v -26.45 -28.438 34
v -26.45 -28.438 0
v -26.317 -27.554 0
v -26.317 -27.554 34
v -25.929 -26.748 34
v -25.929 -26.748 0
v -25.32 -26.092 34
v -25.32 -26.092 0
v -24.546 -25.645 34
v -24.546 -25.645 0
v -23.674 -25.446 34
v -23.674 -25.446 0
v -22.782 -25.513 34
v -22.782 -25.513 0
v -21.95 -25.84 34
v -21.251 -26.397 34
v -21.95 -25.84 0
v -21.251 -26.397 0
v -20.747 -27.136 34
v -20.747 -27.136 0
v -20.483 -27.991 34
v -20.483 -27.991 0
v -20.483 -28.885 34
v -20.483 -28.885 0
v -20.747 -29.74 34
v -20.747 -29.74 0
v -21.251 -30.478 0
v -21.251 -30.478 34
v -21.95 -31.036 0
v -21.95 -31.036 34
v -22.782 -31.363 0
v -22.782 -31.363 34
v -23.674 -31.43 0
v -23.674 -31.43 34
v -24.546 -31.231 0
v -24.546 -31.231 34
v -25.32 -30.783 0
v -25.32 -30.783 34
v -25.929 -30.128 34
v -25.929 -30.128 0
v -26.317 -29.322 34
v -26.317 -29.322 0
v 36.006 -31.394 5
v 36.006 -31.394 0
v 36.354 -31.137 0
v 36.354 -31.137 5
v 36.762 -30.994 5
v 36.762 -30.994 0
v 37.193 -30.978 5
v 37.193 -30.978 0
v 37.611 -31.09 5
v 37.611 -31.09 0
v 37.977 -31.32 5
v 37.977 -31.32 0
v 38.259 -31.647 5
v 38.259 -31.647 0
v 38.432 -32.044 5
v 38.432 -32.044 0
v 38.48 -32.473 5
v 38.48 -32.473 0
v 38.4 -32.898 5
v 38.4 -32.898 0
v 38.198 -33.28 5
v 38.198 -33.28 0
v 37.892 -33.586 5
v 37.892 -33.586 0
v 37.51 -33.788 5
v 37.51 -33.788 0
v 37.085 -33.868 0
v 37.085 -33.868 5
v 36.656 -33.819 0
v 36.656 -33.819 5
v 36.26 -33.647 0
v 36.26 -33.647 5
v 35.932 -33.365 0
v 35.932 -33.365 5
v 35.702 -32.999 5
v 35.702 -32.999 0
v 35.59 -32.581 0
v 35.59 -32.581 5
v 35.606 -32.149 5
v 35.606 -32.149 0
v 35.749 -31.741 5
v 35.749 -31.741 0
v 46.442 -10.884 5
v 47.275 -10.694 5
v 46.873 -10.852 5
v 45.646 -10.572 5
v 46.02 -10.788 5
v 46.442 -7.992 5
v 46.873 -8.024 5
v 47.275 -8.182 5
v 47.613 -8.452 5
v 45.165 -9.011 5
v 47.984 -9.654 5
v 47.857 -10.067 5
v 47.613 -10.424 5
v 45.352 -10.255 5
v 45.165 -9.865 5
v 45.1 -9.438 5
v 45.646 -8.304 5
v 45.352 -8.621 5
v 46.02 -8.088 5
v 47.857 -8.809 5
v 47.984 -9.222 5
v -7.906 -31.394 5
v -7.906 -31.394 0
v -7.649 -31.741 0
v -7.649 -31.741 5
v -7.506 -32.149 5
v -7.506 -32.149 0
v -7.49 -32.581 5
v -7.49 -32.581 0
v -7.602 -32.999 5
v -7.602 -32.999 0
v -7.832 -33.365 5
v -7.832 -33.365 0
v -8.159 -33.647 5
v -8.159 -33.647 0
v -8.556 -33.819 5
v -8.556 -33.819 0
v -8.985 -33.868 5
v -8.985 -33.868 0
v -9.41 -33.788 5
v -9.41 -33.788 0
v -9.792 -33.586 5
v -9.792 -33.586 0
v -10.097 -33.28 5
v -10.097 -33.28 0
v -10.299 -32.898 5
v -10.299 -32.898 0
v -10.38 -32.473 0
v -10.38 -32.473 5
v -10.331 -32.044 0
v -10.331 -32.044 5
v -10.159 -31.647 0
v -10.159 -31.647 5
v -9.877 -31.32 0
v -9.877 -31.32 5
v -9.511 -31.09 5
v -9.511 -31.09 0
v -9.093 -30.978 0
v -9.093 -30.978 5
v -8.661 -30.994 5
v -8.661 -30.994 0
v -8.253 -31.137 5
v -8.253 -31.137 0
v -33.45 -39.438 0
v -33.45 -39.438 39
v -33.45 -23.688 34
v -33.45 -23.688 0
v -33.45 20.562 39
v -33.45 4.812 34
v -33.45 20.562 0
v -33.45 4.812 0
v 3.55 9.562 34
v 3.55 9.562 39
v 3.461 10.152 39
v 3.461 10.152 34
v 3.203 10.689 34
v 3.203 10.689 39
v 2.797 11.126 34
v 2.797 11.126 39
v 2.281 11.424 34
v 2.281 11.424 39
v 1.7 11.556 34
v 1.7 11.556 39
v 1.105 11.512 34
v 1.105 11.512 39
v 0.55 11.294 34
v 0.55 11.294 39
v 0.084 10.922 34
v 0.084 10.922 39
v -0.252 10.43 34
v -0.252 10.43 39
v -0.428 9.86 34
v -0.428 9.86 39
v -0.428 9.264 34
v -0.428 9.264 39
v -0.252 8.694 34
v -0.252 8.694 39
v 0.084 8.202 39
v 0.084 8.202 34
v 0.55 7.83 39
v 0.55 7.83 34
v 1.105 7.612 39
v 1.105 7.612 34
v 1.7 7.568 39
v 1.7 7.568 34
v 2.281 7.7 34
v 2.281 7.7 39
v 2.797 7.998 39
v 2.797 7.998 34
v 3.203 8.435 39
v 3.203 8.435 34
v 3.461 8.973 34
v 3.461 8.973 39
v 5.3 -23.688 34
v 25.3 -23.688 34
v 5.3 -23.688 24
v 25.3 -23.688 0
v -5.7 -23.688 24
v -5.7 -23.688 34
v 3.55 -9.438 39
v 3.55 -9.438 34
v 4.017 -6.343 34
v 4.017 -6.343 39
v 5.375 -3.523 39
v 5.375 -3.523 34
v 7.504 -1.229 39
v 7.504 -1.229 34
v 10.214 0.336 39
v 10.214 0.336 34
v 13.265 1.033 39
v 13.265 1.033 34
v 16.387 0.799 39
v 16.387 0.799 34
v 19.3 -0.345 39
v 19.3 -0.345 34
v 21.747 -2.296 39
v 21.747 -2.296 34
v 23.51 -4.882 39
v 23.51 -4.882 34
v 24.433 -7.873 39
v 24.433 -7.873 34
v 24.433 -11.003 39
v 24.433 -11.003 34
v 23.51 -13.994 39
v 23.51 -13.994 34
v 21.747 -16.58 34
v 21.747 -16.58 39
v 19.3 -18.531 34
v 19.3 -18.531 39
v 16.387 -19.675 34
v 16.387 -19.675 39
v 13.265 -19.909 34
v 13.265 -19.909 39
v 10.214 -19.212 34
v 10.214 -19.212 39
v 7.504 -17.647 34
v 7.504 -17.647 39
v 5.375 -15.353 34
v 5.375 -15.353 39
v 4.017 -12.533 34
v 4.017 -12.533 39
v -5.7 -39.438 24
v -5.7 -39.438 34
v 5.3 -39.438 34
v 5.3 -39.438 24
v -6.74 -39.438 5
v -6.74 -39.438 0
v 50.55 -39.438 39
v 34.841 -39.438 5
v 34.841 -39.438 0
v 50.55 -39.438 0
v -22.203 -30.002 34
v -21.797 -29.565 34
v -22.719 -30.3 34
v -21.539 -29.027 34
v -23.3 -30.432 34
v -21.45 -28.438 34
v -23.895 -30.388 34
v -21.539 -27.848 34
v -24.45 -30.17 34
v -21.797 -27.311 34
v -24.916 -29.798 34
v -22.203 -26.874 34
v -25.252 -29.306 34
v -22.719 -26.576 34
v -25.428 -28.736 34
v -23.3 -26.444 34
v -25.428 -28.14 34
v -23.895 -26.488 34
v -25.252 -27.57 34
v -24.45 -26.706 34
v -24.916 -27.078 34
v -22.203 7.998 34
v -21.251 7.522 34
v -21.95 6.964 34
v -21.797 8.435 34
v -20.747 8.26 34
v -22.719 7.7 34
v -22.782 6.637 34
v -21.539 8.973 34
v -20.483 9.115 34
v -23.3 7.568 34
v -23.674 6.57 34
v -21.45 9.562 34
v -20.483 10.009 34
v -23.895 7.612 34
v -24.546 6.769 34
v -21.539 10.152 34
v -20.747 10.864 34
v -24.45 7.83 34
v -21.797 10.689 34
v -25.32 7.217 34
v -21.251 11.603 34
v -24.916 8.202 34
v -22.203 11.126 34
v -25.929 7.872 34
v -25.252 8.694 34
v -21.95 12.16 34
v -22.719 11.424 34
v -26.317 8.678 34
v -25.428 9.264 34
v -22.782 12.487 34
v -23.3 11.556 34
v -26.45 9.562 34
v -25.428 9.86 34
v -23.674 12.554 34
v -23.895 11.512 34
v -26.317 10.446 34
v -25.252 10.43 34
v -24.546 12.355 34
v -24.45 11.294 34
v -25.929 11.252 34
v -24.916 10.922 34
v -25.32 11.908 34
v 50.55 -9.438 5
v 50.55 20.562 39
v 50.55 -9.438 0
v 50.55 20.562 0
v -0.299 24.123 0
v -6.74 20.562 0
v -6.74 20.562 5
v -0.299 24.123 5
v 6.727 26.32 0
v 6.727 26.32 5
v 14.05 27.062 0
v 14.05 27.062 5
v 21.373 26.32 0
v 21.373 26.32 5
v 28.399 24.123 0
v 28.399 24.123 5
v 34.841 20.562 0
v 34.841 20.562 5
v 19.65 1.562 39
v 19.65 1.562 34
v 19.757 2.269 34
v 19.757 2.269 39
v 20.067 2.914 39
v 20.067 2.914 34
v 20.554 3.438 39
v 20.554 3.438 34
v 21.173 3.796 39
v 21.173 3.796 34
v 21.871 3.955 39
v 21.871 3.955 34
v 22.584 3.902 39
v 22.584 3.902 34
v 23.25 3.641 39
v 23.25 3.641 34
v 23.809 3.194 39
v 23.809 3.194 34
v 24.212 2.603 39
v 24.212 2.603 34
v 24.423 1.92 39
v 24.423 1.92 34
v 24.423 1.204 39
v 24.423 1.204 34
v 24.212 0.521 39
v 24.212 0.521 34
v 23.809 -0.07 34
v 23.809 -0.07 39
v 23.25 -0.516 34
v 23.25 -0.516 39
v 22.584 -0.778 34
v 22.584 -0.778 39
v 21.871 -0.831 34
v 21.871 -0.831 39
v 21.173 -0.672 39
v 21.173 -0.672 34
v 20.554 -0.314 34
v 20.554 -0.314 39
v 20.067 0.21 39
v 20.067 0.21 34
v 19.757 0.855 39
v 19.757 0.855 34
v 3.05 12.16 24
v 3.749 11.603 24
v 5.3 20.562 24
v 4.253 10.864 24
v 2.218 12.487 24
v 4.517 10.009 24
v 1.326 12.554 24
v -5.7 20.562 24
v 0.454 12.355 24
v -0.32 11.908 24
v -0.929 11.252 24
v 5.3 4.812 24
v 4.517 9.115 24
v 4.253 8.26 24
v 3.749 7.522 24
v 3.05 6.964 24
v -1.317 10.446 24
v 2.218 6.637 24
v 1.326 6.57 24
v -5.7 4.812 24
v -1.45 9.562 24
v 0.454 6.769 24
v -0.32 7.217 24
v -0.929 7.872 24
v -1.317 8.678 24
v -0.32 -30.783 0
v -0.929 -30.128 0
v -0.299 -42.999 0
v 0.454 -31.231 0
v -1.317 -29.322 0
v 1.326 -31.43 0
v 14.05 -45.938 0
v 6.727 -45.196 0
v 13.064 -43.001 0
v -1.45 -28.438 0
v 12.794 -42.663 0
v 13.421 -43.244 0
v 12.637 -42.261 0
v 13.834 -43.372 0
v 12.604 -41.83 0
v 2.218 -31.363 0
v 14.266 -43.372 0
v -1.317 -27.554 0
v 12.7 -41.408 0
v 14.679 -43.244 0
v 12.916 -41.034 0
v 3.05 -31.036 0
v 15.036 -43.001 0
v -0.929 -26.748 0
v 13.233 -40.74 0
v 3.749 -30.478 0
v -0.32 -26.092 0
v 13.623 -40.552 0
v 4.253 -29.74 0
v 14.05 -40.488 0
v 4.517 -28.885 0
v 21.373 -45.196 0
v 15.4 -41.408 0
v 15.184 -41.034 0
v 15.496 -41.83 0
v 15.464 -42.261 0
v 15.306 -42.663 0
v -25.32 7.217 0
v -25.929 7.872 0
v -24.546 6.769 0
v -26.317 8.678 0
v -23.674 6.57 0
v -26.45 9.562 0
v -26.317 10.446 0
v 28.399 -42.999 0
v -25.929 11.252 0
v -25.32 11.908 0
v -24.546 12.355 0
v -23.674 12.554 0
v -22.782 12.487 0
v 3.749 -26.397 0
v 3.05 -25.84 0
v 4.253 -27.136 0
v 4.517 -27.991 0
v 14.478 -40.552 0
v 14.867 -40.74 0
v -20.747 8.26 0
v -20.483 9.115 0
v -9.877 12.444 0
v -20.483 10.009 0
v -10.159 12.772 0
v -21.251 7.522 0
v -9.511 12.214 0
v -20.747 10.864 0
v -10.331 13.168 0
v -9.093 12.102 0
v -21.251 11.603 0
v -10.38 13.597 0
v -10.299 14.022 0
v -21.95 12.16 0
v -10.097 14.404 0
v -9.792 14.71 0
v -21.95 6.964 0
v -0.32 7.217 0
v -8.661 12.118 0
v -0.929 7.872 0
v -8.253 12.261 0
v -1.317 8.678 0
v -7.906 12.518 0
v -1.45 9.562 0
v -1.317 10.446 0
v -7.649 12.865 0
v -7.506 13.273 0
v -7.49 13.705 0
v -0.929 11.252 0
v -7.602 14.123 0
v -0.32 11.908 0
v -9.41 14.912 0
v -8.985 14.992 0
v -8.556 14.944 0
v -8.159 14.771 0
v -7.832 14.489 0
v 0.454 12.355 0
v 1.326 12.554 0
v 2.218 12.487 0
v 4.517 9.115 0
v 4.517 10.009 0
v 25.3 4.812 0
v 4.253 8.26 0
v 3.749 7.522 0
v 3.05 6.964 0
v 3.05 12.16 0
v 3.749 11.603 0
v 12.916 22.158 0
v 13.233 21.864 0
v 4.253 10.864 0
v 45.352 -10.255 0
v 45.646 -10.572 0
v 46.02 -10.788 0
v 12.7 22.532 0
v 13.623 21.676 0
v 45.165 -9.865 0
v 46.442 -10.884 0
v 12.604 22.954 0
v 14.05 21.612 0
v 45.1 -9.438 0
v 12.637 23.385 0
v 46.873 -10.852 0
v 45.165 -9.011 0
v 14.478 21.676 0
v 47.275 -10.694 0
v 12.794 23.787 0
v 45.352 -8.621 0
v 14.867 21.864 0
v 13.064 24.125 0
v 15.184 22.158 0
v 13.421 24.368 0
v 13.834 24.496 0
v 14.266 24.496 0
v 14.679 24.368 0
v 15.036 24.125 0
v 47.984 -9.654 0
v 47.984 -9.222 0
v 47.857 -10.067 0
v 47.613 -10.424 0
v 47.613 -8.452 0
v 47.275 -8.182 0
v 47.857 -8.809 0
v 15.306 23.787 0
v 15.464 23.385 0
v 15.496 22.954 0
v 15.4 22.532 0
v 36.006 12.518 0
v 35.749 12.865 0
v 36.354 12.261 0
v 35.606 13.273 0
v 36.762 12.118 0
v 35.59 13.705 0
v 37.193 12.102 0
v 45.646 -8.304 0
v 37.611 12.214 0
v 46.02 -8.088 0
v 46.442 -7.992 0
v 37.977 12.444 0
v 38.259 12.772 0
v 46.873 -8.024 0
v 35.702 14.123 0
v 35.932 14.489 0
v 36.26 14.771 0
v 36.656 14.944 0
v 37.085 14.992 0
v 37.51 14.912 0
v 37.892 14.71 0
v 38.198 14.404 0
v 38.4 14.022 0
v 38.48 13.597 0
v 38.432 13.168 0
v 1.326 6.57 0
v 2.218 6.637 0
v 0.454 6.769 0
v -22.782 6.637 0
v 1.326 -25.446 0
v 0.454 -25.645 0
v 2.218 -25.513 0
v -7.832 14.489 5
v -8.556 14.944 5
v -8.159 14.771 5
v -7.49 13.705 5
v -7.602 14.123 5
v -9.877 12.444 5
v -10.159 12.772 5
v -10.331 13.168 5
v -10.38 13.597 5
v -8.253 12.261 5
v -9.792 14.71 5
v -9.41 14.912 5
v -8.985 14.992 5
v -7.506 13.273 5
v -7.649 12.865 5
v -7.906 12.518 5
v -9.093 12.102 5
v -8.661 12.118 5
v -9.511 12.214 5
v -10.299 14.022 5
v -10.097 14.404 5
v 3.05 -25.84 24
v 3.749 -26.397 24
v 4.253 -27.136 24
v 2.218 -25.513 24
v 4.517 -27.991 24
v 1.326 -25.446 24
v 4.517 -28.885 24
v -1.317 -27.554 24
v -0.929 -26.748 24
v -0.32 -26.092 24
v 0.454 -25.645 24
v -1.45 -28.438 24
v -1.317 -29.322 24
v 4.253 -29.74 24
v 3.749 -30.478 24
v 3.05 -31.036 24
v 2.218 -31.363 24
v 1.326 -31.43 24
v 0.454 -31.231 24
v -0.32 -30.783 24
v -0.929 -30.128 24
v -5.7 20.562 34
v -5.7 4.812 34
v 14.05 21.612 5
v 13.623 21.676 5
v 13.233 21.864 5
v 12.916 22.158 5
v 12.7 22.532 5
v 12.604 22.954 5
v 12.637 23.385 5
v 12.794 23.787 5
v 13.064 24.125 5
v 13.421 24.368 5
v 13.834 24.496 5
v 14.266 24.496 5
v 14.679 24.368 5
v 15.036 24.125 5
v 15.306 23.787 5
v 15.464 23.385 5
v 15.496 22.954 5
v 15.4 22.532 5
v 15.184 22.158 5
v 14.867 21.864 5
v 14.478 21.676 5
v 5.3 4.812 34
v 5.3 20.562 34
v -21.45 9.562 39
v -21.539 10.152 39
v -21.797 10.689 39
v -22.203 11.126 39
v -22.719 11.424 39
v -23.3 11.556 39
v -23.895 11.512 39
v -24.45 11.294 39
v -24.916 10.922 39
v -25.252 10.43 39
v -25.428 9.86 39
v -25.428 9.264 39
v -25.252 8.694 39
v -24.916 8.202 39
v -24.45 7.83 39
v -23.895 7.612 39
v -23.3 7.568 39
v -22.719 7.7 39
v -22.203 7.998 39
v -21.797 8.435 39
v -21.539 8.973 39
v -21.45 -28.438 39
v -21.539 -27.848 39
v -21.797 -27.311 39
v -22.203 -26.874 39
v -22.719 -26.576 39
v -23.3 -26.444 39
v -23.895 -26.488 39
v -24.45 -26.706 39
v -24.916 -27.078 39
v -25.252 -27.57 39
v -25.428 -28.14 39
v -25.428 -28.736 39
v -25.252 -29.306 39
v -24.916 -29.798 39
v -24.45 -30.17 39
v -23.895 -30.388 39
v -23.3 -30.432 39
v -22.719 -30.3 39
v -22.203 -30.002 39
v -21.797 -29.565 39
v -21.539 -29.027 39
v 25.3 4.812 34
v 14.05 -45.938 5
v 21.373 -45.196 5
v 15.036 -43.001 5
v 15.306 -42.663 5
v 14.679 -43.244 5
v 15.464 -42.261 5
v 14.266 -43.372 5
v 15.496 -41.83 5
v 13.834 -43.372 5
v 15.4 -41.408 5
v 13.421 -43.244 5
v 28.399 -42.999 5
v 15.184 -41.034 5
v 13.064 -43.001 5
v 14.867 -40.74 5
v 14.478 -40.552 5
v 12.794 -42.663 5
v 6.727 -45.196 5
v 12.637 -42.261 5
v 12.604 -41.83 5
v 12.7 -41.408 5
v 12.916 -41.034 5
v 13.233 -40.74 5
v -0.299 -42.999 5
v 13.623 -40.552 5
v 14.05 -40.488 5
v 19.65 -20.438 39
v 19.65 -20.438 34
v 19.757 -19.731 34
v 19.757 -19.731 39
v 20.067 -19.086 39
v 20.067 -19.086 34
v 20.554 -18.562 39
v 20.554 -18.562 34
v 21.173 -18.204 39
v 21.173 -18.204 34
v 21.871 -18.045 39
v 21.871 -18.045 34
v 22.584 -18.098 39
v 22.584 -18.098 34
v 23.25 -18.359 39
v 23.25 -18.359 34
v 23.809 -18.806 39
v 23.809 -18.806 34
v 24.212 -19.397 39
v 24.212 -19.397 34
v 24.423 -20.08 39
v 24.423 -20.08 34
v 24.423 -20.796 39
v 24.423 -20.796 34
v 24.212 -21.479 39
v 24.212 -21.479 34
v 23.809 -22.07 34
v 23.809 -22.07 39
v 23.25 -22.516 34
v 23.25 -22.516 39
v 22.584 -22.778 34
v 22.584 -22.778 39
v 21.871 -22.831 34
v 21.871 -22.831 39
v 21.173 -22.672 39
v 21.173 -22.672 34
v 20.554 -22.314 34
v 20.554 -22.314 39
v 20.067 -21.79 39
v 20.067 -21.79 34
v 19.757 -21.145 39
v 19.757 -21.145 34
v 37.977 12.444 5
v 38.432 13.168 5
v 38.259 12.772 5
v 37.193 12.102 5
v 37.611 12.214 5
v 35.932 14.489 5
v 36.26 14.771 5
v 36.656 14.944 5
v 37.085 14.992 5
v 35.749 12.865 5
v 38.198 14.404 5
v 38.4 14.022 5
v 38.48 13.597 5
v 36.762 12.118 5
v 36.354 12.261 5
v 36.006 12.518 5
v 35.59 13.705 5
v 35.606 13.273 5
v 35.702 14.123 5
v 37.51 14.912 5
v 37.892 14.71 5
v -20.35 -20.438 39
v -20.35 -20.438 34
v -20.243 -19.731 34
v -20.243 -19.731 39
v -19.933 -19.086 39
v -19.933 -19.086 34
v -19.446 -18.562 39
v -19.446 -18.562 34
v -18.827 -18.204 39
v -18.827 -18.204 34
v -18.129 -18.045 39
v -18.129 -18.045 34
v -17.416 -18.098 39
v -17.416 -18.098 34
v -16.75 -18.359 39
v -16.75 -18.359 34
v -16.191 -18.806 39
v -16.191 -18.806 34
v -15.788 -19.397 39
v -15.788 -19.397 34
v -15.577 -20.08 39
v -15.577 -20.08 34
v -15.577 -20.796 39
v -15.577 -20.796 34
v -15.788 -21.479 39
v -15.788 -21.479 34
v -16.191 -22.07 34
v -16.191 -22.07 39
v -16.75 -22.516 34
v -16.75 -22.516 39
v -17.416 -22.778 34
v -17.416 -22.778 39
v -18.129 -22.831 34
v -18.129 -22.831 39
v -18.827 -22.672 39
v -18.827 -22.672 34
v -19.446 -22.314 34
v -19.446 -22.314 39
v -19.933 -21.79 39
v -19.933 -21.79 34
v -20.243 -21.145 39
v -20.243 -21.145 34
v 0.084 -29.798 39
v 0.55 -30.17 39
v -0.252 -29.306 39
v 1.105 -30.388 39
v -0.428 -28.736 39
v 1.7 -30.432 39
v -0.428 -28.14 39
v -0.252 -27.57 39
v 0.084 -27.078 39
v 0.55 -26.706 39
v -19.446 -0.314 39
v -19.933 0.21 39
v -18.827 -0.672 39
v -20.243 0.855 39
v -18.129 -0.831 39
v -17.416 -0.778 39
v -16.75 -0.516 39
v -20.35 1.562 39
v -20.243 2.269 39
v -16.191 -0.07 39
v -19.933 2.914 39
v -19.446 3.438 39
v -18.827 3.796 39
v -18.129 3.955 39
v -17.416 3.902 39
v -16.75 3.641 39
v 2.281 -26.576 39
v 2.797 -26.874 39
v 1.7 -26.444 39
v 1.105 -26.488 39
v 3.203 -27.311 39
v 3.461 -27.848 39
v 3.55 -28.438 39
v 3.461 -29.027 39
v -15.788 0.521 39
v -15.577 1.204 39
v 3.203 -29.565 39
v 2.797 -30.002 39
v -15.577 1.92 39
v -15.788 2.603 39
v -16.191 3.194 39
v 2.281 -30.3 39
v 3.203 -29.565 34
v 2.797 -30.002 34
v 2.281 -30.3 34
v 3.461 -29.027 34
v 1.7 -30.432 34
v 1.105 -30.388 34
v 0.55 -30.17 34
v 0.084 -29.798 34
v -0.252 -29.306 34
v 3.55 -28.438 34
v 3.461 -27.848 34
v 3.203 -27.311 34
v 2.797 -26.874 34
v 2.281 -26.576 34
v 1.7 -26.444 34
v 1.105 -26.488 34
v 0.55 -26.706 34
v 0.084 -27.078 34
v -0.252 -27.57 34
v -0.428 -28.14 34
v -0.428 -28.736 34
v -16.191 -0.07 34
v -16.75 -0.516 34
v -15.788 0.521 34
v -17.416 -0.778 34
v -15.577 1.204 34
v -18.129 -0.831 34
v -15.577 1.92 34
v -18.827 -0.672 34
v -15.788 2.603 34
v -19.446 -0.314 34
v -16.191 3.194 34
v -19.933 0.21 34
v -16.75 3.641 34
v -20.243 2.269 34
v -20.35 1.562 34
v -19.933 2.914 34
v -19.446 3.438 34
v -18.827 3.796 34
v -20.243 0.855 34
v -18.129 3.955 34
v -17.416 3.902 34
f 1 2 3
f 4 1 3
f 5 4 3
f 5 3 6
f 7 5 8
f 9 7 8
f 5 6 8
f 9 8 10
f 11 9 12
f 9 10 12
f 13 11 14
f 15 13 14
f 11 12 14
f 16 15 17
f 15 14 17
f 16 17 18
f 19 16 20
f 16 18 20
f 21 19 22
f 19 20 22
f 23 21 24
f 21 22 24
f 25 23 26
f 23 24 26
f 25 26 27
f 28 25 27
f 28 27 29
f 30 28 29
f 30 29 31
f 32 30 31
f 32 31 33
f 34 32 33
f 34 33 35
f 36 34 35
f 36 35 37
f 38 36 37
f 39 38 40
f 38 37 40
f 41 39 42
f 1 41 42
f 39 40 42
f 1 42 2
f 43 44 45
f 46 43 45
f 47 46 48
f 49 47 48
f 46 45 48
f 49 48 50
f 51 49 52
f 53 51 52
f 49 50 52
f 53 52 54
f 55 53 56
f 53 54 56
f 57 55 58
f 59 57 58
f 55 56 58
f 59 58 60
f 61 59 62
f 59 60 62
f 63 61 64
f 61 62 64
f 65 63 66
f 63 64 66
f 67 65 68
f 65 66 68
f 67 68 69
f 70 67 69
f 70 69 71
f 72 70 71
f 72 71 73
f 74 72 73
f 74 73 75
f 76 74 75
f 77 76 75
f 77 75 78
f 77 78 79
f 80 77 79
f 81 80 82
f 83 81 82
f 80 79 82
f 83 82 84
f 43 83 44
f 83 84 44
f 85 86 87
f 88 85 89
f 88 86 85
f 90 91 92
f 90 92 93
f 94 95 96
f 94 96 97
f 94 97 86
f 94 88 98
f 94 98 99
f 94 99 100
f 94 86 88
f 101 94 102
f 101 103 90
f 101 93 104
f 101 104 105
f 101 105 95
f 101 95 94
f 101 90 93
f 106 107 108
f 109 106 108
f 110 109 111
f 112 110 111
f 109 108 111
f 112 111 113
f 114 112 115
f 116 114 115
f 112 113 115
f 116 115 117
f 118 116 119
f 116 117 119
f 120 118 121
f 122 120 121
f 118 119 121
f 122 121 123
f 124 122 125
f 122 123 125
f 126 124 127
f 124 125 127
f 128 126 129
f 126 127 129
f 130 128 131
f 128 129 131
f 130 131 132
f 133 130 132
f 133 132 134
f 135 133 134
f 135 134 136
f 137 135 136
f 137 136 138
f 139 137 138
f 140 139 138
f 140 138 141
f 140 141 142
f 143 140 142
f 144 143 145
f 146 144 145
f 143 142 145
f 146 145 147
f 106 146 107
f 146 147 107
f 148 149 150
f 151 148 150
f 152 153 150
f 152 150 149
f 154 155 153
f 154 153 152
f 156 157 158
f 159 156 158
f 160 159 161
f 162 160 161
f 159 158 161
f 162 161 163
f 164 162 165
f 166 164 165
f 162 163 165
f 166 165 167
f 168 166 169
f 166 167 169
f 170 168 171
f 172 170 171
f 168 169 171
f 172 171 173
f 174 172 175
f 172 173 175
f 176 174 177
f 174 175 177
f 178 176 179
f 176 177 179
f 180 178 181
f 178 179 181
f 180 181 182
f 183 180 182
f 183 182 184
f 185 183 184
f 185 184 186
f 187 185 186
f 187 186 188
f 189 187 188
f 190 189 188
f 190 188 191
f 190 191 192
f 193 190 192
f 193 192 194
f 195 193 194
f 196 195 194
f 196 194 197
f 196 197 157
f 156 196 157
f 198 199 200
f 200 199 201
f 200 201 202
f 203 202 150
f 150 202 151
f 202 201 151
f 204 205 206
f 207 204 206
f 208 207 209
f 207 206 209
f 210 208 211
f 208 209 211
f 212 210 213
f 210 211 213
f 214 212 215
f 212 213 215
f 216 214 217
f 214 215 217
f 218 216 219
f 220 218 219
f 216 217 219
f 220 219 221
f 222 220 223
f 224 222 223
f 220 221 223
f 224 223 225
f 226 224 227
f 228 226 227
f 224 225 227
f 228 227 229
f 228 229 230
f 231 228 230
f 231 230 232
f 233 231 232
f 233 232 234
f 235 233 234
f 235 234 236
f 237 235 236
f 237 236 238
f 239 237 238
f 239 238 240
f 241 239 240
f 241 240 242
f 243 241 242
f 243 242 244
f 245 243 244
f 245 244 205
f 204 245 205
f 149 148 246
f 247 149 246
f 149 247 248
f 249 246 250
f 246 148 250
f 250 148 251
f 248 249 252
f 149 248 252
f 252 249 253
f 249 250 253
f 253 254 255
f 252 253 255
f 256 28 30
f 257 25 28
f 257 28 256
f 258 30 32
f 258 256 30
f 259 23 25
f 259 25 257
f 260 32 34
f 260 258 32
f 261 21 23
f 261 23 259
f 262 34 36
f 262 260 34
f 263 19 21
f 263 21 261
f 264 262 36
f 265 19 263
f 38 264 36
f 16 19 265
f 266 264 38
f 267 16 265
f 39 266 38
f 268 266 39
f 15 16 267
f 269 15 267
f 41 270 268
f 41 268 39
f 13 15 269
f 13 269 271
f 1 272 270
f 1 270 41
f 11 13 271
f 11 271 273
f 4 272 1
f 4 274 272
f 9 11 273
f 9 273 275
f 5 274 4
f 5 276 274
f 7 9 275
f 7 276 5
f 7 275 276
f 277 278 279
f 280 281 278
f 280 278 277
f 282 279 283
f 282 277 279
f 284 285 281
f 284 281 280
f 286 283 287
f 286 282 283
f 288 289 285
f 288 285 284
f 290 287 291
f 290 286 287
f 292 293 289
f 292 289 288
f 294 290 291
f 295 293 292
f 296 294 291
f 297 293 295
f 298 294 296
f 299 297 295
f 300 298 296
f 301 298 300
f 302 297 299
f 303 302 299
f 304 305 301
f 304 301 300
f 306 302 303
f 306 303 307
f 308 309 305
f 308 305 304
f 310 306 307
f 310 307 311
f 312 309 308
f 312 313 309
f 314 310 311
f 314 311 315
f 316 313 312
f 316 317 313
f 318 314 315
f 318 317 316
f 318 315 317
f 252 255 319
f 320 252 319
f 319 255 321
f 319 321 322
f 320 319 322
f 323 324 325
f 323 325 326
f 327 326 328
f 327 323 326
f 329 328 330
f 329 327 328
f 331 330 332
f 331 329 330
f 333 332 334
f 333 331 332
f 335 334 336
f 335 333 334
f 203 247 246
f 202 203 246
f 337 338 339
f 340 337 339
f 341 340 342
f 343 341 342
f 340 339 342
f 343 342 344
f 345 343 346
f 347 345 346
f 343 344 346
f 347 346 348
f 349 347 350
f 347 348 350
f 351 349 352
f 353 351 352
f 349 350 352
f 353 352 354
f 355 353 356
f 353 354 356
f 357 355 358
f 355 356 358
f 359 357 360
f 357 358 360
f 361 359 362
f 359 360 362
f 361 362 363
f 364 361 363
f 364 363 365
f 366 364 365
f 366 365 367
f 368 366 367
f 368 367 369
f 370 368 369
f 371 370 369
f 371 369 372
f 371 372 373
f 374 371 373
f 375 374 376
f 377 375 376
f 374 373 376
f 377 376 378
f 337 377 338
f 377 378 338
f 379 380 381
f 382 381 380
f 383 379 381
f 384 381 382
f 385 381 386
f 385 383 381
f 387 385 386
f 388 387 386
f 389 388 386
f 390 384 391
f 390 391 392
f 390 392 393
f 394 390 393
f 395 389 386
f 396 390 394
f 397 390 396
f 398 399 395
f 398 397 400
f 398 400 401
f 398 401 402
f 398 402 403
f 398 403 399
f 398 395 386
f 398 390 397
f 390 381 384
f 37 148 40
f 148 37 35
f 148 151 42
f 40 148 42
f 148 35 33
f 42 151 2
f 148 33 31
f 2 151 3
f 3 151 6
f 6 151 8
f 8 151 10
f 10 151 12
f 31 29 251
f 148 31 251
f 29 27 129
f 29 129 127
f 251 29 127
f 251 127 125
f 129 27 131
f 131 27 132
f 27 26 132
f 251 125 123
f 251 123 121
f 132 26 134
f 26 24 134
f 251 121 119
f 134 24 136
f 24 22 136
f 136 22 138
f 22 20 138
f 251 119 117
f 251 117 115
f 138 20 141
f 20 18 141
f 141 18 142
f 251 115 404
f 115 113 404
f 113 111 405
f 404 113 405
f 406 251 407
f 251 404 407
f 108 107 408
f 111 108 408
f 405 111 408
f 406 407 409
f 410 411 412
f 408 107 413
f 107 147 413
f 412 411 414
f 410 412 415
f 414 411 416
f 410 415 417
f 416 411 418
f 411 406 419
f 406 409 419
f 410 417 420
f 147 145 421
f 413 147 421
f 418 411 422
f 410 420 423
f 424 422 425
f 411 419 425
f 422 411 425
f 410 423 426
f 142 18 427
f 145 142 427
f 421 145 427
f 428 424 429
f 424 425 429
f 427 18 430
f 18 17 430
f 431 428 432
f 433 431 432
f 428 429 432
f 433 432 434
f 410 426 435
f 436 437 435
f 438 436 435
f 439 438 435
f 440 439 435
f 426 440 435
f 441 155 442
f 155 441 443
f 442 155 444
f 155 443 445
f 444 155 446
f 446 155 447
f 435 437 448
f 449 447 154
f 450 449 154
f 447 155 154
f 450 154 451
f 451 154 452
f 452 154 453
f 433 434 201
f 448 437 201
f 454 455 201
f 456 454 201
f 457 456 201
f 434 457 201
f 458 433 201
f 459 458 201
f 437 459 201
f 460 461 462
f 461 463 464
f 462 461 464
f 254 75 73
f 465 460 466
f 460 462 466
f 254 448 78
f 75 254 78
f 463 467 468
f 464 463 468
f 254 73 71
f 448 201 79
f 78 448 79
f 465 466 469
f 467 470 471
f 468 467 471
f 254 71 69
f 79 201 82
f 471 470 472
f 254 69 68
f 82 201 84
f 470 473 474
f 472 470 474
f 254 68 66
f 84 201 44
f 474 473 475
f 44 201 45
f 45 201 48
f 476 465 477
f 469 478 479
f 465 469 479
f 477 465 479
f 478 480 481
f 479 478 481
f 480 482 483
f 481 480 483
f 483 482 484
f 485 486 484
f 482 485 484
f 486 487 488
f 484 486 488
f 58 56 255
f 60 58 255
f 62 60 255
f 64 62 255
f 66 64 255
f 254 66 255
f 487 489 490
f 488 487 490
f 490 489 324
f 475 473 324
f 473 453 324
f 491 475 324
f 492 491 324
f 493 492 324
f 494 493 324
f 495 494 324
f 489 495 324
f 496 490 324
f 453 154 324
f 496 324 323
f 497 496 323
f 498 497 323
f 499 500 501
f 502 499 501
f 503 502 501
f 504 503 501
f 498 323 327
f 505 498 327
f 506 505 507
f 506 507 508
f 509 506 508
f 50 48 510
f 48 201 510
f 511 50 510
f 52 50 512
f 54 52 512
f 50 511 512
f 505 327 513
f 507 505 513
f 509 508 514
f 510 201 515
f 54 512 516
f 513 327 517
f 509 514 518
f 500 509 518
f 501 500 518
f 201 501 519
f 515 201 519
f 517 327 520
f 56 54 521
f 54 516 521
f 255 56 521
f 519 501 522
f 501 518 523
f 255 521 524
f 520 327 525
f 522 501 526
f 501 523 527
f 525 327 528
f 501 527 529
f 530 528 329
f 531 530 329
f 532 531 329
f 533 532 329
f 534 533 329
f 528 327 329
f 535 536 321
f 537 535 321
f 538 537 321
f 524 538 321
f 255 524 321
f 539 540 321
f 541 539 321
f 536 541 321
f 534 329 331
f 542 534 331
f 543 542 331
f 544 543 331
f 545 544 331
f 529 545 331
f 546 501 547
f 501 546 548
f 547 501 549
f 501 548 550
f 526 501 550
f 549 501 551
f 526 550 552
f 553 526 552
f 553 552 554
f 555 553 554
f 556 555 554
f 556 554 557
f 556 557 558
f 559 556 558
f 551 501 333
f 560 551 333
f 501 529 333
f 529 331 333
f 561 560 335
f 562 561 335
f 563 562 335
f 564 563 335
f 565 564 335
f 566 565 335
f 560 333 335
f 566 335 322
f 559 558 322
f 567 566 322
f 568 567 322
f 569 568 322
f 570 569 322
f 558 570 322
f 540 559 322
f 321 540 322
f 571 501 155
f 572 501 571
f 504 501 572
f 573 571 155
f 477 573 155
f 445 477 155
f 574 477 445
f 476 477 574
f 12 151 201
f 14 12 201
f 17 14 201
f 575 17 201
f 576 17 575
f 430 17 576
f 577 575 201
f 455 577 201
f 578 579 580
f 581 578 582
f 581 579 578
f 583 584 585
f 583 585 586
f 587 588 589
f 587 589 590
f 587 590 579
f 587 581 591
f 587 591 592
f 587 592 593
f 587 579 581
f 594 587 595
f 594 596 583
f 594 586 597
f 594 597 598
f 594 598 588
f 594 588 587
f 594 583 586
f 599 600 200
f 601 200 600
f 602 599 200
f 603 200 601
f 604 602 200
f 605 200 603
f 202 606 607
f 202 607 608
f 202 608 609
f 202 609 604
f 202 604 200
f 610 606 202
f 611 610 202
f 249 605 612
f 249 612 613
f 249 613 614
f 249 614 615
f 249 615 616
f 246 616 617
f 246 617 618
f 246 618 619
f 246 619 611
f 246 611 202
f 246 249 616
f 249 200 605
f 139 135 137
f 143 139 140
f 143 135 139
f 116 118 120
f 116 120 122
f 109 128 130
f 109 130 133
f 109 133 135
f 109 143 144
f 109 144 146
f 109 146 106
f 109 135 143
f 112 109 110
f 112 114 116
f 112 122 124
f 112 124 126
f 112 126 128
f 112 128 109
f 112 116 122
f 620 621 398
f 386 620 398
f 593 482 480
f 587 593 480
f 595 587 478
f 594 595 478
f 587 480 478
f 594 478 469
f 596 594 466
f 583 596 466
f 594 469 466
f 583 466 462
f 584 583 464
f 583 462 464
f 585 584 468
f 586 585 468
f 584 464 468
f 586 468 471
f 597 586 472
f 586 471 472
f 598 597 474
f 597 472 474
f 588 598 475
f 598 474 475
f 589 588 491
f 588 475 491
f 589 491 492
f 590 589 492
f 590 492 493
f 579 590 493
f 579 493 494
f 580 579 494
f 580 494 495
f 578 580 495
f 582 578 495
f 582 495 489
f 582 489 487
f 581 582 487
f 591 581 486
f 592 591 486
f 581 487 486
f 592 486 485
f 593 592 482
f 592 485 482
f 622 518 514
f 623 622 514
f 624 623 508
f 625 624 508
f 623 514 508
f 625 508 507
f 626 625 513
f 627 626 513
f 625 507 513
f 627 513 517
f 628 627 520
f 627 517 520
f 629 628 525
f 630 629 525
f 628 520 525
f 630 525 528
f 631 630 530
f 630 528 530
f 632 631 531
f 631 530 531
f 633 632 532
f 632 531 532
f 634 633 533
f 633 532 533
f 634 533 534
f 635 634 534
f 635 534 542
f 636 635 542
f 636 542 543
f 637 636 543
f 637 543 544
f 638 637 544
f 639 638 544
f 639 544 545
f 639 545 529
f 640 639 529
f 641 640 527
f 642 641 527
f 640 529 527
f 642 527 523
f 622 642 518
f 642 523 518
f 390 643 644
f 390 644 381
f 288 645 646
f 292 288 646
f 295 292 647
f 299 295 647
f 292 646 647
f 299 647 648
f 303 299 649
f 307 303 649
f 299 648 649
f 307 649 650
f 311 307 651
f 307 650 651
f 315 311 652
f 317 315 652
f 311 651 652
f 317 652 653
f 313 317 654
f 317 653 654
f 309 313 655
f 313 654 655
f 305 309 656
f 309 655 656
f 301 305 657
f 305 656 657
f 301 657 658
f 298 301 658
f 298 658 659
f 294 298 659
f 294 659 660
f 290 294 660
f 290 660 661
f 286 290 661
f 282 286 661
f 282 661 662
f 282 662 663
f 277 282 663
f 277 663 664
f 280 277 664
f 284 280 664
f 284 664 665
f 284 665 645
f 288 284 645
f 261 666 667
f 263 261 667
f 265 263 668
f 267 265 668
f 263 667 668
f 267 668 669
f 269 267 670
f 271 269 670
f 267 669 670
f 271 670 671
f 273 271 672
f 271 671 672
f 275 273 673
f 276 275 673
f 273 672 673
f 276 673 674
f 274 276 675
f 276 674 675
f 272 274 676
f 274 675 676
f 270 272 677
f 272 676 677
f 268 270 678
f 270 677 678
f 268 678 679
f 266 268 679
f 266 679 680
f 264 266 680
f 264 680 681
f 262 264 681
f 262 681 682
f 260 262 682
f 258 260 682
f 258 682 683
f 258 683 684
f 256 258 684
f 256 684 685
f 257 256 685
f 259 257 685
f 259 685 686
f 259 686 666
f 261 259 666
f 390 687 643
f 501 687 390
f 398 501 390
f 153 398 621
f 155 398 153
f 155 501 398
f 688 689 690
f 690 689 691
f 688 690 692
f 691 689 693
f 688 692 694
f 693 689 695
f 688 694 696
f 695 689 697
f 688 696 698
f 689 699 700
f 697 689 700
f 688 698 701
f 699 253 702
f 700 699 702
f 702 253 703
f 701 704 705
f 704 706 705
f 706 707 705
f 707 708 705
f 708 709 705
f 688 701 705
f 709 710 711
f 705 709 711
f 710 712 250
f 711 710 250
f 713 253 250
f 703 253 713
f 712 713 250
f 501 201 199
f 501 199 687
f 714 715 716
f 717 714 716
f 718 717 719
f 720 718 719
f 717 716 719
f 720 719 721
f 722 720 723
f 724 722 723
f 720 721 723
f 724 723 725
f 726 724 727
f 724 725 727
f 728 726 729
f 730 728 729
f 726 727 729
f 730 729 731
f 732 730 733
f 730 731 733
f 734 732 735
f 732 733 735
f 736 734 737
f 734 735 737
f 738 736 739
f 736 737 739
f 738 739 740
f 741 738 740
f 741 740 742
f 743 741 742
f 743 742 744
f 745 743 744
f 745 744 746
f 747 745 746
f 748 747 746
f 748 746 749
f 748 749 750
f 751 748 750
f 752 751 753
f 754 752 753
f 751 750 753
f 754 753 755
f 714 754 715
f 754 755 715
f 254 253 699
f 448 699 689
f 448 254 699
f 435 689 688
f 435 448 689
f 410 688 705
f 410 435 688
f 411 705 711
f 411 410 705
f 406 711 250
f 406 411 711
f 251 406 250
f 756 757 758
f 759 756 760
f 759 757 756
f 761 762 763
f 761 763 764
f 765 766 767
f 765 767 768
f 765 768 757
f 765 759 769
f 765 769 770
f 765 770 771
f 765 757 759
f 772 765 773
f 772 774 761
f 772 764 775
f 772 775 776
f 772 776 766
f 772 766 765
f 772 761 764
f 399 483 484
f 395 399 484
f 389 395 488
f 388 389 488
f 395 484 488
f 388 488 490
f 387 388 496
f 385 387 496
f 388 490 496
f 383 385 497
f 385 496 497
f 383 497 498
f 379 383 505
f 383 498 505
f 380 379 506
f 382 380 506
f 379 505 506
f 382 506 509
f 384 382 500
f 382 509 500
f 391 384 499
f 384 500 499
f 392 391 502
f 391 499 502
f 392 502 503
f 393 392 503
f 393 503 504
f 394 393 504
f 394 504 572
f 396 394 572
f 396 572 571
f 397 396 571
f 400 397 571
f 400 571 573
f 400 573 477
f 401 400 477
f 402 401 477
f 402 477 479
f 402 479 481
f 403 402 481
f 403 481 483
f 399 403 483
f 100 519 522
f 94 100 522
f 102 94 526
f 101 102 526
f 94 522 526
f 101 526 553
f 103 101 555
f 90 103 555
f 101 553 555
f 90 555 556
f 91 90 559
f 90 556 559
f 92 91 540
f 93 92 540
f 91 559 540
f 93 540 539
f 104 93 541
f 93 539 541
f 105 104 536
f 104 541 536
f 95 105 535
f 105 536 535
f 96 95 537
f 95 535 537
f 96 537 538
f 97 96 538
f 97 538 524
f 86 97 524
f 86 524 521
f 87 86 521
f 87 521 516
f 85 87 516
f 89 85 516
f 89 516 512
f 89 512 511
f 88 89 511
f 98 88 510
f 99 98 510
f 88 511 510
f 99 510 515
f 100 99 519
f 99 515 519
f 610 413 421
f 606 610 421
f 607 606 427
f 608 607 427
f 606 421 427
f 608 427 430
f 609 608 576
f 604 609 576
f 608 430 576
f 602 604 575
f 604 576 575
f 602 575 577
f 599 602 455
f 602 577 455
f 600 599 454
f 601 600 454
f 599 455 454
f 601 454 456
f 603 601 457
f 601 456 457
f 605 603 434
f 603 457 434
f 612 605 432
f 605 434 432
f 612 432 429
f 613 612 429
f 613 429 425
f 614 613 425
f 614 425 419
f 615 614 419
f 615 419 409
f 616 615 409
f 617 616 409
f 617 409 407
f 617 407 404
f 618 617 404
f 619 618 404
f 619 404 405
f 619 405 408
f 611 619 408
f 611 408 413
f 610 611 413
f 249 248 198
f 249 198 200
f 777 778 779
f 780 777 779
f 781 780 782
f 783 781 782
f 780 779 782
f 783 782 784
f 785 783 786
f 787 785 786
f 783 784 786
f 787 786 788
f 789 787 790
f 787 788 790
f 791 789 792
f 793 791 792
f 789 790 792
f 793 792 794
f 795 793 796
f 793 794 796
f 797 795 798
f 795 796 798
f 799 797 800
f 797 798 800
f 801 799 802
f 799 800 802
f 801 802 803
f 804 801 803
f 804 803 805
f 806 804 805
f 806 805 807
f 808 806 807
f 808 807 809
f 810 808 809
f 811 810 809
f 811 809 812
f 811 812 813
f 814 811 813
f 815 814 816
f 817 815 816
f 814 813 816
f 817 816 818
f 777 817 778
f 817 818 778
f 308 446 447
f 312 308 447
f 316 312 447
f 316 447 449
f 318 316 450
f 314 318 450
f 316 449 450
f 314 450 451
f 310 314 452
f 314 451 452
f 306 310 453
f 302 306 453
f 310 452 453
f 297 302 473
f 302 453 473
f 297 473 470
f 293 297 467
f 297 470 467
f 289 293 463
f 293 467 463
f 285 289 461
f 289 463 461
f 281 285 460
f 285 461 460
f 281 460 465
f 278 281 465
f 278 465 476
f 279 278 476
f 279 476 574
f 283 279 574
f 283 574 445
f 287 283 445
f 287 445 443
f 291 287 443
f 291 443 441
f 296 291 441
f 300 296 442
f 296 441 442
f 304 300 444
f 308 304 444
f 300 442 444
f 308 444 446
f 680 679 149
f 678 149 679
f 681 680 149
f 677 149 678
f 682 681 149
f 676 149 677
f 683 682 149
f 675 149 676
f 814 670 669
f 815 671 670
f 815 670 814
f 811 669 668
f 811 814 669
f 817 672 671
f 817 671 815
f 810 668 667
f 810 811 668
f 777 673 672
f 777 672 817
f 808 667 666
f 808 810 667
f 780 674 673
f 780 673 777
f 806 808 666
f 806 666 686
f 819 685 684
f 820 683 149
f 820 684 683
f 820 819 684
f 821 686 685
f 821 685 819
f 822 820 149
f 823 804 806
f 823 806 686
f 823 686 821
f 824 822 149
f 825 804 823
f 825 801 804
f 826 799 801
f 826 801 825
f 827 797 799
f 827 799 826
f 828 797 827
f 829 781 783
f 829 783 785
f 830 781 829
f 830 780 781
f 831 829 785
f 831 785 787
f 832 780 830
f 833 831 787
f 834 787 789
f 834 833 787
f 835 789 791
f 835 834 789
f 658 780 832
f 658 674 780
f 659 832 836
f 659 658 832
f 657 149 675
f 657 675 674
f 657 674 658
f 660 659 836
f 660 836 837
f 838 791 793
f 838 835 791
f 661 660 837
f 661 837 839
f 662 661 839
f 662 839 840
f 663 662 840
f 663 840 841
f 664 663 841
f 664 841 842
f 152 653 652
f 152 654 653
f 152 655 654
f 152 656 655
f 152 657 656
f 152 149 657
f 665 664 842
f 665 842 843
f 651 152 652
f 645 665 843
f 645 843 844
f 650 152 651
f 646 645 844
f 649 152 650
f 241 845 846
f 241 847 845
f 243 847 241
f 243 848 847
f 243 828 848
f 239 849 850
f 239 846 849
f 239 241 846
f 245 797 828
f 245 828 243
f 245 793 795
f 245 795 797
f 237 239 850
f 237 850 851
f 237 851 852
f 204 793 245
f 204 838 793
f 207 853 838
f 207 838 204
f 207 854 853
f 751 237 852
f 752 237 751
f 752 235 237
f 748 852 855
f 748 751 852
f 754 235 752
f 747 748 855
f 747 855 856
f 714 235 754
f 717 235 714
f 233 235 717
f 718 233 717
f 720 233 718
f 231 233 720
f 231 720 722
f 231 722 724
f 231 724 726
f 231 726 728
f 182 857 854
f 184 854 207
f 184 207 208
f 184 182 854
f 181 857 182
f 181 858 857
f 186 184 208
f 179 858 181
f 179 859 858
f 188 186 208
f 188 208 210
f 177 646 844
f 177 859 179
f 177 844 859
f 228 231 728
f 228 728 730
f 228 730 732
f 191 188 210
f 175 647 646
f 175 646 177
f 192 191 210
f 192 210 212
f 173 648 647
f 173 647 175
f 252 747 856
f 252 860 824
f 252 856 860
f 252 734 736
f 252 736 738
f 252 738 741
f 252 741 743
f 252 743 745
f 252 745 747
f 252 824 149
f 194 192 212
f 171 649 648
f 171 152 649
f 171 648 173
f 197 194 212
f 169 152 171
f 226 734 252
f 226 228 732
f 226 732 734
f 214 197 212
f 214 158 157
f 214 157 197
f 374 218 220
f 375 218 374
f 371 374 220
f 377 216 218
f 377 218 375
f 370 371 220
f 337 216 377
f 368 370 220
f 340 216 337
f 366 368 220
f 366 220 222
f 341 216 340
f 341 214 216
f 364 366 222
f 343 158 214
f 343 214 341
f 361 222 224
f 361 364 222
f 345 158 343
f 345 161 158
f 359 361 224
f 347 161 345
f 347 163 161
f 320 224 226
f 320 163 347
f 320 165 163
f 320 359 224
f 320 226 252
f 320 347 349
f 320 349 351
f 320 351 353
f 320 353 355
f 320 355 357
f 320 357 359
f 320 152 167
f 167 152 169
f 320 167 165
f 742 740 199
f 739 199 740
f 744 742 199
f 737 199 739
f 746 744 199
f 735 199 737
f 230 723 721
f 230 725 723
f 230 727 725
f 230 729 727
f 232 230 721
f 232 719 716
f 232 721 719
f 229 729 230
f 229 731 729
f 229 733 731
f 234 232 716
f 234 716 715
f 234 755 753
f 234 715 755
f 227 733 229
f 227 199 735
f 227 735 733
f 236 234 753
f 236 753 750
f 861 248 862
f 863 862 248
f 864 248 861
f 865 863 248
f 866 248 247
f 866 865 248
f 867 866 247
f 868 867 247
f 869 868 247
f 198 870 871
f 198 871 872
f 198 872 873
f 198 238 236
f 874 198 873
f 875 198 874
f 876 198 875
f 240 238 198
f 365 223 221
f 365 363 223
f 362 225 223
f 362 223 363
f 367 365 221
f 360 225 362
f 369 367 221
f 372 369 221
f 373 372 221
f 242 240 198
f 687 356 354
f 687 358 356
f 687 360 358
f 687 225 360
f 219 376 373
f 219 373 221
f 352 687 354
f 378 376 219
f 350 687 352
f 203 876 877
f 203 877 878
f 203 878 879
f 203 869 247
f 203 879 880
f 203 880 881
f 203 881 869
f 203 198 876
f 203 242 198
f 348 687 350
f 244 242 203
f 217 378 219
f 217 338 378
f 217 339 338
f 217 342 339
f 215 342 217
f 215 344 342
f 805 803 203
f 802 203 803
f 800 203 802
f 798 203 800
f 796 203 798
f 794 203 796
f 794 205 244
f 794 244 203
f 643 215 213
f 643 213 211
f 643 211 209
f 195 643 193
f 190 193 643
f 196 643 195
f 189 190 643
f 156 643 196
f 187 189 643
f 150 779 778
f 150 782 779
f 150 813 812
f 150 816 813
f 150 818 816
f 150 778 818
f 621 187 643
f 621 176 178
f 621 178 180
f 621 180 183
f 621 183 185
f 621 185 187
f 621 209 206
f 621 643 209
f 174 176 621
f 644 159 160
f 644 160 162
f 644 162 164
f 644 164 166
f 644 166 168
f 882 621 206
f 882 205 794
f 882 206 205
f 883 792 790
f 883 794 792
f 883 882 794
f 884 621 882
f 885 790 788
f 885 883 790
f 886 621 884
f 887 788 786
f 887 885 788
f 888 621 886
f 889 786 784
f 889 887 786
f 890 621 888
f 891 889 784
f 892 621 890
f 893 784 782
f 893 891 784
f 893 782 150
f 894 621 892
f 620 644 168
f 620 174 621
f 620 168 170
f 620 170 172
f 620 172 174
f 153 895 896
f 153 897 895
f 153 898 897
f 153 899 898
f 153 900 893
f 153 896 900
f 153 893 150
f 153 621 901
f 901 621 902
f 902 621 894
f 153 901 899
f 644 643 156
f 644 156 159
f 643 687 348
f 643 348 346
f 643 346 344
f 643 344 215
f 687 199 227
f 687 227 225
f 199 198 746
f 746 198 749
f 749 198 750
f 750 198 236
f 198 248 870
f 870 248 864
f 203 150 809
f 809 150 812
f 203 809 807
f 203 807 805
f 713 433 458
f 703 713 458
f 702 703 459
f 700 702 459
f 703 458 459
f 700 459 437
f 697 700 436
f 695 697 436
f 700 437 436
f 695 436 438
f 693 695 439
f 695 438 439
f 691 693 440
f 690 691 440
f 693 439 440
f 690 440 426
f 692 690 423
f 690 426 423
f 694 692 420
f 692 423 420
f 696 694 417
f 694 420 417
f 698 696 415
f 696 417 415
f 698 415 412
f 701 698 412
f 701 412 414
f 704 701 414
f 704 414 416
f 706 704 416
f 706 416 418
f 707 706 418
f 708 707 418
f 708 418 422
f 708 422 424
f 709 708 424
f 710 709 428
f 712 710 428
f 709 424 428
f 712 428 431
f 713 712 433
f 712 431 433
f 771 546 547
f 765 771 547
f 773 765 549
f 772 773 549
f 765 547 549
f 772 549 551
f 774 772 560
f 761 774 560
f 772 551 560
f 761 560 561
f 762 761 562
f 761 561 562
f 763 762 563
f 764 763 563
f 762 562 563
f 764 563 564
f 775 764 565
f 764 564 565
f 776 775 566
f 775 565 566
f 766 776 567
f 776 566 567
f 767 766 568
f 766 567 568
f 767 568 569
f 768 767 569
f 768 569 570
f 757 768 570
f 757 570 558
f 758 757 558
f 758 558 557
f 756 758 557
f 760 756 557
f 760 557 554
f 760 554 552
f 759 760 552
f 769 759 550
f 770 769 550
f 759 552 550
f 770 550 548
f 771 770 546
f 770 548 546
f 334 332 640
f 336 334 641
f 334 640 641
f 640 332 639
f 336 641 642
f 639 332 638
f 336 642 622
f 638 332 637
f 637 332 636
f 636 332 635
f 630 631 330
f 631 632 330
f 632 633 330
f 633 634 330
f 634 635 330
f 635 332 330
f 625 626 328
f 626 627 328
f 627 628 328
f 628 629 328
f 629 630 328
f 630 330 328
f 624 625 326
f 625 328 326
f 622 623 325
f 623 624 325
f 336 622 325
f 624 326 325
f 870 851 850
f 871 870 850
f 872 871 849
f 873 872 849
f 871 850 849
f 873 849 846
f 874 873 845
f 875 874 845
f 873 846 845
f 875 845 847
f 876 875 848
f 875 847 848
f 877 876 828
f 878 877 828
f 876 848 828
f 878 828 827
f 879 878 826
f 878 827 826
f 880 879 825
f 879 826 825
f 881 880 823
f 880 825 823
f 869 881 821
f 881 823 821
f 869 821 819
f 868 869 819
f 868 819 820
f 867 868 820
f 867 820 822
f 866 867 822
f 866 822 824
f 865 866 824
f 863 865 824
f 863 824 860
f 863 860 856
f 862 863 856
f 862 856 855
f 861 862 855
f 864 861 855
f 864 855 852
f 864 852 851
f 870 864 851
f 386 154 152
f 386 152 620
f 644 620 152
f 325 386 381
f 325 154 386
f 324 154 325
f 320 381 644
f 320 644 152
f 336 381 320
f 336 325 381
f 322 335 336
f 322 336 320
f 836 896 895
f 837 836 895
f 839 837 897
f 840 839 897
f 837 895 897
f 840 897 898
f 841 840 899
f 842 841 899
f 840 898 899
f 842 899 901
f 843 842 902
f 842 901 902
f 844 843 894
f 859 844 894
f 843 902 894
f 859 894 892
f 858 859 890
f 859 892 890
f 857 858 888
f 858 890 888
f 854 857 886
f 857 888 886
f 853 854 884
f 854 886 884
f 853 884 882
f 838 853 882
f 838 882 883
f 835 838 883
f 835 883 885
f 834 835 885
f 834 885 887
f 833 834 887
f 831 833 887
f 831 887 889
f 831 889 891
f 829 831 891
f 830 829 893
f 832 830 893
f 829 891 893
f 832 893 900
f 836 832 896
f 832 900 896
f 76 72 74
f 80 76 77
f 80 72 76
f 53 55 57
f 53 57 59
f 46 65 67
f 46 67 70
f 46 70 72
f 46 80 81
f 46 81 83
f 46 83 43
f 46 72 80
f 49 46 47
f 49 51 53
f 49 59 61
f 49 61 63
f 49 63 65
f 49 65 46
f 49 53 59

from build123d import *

# Parameters (mm, degrees)
SKETCH_1_W               = 84
SKETCH_1_H               = 60
EXTRUDE_1_DEPTH          = 39
SKETCH_3_R               = 36.5
EXTRUDE_2_DEPTH          = 5
SKETCH_4_R               = 1.45
CUT_EXTRUDE_2_DEPTH      = 5
PATTERN_CIRCULAR_1_COUNT = 8
SKETCH_2_W               = 58.75
SKETCH_2_H               = 28.5
CUT_EXTRUDE_1_DEPTH      = 34
SKETCH_6_R               = 10.5
SKETCH_6_R_2             = 2.4
CUT_EXTRUDE_3_DEPTH      = 5
SKETCH_7_R               = 2
CUT_EXTRUDE_4_DEPTH      = 40
SKETCH_8_R               = 3
CUT_EXTRUDE_5_DEPTH      = 34
SKETCH_9_W               = 11
SKETCH_9_H               = 10
CUT_EXTRUDE_6_DEPTH      = 100


with BuildPart() as part:
    # 草图1 → 凸台-拉伸1 (new body)
    with BuildSketch(Plane.XY):
        with Locations((8.550148957, -9.437934459)):
            Rectangle(SKETCH_1_W, SKETCH_1_H)
    extrude(amount=EXTRUDE_1_DEPTH)

    # 草图3 → 凸台-拉伸2 (add)
    with BuildSketch(Plane(origin=(0, 0, 0), x_dir=(-1, 0, 0), z_dir=(0, 0, -1))):
        with Locations((-14.050148957, -9.437934459)):
            Circle(SKETCH_3_R)
    extrude(amount=-EXTRUDE_2_DEPTH)

    # 草图4 → 切除-拉伸2 (cut)
    with BuildSketch(Plane(origin=(0, 0, 0), x_dir=(-1, 0, 0), z_dir=(0, 0, -1))):
        with Locations((-46.550148957, -9.437934459)):
            Circle(SKETCH_4_R)
    cut_extrude_2 = extrude(amount=-CUT_EXTRUDE_2_DEPTH, mode=Mode.SUBTRACT)

    # 阵列(圆周)1: 切除-拉伸2 ×8 about axis
    pattern_circular_1_axis = Axis((14.050148957, -9.437934459, 0), (0, 0, 1))
    for i in range(1, PATTERN_CIRCULAR_1_COUNT):
        add(cut_extrude_2.rotate(pattern_circular_1_axis, i * 360 / PATTERN_CIRCULAR_1_COUNT), mode=Mode.SUBTRACT)

    # 草图2 → 切除-拉伸1 (cut)
    with BuildSketch(Plane(origin=(0, 0, 0), x_dir=(-1, 0, 0), z_dir=(0, 0, -1))):
        with Locations((4.074851043, -9.437934459)):
            Rectangle(SKETCH_2_W, SKETCH_2_H)
    extrude(amount=-CUT_EXTRUDE_1_DEPTH, mode=Mode.SUBTRACT)

    # 草图6 → 切除-拉伸3 (cut)
    with BuildSketch(Plane(origin=(0, 0, 34), x_dir=(-1, 0, 0), z_dir=(0, 0, -1))):
        with Locations((-14.050148957, -9.437934459)):
            Circle(SKETCH_6_R)
        with Locations((-22.050148957, 1.562065541)):
            Circle(SKETCH_6_R_2)
        with Locations((-22.050148957, -20.437934459)):
            Circle(SKETCH_6_R_2)
        with Locations((17.949851043, -20.437934459)):
            Circle(SKETCH_6_R_2)
        with Locations((17.949851043, 1.562065541)):
            Circle(SKETCH_6_R_2)
    extrude(amount=-CUT_EXTRUDE_3_DEPTH, mode=Mode.SUBTRACT)

    # 草图7 → 切除-拉伸4 (cut)
    with BuildSketch(Plane.XY.offset(39)):
        with Locations((-23.449851043, 9.562065541)):
            Circle(SKETCH_7_R)
        with Locations((-23.449851043, -28.437934459)):
            Circle(SKETCH_7_R)
        with Locations((1.550148957, 9.562065541)):
            Circle(SKETCH_7_R)
        with Locations((1.550148957, -28.437934459)):
            Circle(SKETCH_7_R)
    extrude(amount=-CUT_EXTRUDE_4_DEPTH, mode=Mode.SUBTRACT)

    # 草图8 → 切除-拉伸5 (cut)
    with BuildSketch(Plane(origin=(0, 0, 0), x_dir=(-1, 0, 0), z_dir=(0, 0, -1))):
        with Locations((-1.550148957, 9.562065541)):
            Circle(SKETCH_8_R)
        with Locations((23.449851043, 9.562065541)):
            Circle(SKETCH_8_R)
        with Locations((-1.550148957, -28.437934459)):
            Circle(SKETCH_8_R)
        with Locations((23.449851043, -28.437934459)):
            Circle(SKETCH_8_R)
    extrude(amount=-CUT_EXTRUDE_5_DEPTH, mode=Mode.SUBTRACT)

    # 草图9 → 切除-拉伸6 (cut)
    with BuildSketch(Plane(origin=(0, -39.437934459, 0), x_dir=(-1, 0, 0), z_dir=(0, -1, 0))):
        with Locations((0.199851043, -29)):
            Rectangle(SKETCH_9_W, SKETCH_9_H)
    extrude(amount=-CUT_EXTRUDE_6_DEPTH, mode=Mode.SUBTRACT)


solid = part.part
